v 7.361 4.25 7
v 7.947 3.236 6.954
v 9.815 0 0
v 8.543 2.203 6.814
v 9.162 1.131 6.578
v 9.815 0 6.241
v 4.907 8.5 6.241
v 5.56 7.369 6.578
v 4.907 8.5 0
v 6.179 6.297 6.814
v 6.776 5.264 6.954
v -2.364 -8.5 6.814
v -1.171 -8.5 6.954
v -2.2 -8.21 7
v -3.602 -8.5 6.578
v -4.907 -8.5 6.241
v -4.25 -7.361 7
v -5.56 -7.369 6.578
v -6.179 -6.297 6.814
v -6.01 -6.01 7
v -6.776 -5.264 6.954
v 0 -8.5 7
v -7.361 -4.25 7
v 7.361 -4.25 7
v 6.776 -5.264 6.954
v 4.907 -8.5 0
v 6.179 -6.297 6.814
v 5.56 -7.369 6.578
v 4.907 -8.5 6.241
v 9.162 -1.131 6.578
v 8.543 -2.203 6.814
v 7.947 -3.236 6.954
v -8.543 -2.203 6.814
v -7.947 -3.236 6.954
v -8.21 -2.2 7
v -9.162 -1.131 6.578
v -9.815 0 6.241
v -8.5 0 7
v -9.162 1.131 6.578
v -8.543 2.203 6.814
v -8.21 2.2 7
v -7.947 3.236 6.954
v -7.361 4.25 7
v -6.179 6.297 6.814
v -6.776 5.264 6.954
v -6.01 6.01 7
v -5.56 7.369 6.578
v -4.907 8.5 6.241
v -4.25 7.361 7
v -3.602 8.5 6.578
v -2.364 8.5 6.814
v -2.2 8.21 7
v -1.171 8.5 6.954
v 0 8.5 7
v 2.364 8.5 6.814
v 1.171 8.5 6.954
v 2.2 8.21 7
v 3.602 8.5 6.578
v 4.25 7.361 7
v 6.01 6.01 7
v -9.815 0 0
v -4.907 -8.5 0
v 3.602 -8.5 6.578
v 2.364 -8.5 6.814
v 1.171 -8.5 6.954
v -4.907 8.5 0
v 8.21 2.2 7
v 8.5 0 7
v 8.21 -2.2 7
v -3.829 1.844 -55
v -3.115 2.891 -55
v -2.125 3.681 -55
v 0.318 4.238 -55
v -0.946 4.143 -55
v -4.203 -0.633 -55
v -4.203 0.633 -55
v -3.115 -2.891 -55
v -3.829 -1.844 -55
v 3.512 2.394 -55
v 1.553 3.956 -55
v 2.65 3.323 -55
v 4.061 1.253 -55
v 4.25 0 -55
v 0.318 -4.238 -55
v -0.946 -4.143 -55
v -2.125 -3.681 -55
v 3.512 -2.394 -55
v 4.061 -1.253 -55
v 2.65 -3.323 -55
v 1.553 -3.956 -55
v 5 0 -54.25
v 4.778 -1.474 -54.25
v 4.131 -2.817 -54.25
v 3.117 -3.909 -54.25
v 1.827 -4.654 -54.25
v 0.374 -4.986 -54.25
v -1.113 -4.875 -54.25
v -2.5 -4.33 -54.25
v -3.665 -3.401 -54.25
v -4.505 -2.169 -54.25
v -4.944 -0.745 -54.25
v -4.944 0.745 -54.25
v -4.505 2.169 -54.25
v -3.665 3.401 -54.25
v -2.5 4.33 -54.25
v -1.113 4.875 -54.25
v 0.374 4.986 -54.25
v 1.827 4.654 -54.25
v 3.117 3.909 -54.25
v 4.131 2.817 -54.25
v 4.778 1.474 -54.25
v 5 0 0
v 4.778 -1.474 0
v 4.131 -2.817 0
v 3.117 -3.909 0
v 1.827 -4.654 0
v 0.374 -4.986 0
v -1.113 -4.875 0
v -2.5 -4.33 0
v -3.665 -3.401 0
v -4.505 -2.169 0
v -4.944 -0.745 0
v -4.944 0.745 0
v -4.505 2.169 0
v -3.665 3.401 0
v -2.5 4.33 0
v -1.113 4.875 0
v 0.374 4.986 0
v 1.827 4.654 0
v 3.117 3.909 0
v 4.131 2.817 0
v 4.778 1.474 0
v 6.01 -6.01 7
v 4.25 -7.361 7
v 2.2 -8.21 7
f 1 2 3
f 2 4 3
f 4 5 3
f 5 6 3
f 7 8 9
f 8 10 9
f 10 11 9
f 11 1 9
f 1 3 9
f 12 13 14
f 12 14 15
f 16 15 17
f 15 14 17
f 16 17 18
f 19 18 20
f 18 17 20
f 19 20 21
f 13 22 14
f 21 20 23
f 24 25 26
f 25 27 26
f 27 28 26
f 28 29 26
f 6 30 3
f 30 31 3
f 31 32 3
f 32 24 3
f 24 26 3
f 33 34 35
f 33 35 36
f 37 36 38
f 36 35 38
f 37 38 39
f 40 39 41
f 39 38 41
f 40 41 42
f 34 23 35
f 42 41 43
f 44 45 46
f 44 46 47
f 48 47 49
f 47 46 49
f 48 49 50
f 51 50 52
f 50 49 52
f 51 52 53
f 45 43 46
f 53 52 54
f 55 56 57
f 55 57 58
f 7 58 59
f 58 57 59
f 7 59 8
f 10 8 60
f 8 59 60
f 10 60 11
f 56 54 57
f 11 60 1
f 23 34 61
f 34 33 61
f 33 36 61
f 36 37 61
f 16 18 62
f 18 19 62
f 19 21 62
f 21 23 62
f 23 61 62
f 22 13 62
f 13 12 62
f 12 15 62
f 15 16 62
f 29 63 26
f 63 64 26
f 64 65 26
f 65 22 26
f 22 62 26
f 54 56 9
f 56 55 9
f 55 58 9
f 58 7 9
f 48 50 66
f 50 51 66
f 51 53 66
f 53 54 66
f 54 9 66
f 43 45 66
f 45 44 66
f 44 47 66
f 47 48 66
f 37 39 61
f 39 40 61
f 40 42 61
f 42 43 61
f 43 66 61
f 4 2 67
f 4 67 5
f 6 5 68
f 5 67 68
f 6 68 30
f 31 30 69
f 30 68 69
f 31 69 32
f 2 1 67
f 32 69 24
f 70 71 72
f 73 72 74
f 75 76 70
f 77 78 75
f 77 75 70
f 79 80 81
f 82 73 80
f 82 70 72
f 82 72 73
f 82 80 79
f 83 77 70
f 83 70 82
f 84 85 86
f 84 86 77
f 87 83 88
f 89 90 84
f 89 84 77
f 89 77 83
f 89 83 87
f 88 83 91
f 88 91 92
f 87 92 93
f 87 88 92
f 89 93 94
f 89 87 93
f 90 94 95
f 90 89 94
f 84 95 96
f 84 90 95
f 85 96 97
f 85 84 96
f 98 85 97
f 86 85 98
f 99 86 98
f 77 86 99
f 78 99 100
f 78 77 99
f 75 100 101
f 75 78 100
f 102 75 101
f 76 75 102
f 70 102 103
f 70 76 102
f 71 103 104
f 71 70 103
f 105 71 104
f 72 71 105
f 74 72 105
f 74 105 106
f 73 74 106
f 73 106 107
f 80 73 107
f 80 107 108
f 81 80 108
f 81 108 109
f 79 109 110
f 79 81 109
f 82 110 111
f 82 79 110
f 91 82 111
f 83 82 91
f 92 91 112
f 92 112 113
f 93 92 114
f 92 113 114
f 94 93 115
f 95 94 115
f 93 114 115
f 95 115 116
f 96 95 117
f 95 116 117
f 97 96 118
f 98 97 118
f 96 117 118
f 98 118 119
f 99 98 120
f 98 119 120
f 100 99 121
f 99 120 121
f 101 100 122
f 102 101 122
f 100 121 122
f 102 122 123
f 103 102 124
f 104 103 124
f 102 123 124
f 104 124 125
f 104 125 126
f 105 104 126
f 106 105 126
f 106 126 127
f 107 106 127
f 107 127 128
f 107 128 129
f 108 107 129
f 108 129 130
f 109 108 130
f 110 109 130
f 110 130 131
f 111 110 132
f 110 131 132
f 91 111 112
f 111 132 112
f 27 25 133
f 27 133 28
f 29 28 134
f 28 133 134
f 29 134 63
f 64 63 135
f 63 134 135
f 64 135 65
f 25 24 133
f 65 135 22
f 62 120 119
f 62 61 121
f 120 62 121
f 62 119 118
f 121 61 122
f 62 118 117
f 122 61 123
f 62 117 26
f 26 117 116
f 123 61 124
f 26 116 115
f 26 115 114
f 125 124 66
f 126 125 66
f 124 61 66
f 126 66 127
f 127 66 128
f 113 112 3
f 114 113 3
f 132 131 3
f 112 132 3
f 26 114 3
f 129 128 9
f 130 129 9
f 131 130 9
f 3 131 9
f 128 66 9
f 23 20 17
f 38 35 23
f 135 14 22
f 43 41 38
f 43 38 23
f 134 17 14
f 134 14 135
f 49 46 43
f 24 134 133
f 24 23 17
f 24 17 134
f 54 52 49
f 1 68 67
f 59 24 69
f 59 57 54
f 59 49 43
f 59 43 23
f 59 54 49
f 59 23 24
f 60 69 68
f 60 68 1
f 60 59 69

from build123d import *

# Parameters (mm, degrees)
BOSS_EXTRUDE1_DEPTH = 7
SKETCH3_R           = 5
BOSS_EXTRUDE2_DEPTH = 55
CHAMFER1_SIZE       = 0.75


with BuildPart() as part:
    # Sketch1 → Boss-Extrude1 (new body)
    with BuildSketch(Plane.XY):
        Polygon((9.814954576, 0), (4.907477288, 8.5), (-4.907477288, 8.5), (-9.814954576, 0), (-4.907477288, -8.5), (4.907477288, -8.5), align=None)
    extrude(amount=BOSS_EXTRUDE1_DEPTH)

    # Sketch2 → Cut-Revolve1 (revolve, cut)
    with BuildSketch(Plane(origin=(0, 0, 0), x_dir=(0, 0, -1), z_dir=(1, 0, 0))):
        Polygon((-7, 8.5), (-7, 13.5), (-4.113248654, 13.5), align=None)
    revolve(axis=Axis((0, 0, 7), (0, 0, -1)), mode=Mode.SUBTRACT)

    # Sketch3 → Boss-Extrude2 (add)
    with BuildSketch(Plane(origin=(0, 0, 0), x_dir=(-1, 0, 0), z_dir=(0, 0, -1))):
        with Locations(Location((0, 0, 0), (0, 0, 180))):
            Circle(SKETCH3_R)
    extrude(amount=BOSS_EXTRUDE2_DEPTH)

    # Chamfer1
    chamfer1_edges = [part.edges().sort_by_distance(p)[0] for p in [
        (-5, 0, -55),
    ]]
    chamfer(chamfer1_edges, length=CHAMFER1_SIZE)


solid = part.part
